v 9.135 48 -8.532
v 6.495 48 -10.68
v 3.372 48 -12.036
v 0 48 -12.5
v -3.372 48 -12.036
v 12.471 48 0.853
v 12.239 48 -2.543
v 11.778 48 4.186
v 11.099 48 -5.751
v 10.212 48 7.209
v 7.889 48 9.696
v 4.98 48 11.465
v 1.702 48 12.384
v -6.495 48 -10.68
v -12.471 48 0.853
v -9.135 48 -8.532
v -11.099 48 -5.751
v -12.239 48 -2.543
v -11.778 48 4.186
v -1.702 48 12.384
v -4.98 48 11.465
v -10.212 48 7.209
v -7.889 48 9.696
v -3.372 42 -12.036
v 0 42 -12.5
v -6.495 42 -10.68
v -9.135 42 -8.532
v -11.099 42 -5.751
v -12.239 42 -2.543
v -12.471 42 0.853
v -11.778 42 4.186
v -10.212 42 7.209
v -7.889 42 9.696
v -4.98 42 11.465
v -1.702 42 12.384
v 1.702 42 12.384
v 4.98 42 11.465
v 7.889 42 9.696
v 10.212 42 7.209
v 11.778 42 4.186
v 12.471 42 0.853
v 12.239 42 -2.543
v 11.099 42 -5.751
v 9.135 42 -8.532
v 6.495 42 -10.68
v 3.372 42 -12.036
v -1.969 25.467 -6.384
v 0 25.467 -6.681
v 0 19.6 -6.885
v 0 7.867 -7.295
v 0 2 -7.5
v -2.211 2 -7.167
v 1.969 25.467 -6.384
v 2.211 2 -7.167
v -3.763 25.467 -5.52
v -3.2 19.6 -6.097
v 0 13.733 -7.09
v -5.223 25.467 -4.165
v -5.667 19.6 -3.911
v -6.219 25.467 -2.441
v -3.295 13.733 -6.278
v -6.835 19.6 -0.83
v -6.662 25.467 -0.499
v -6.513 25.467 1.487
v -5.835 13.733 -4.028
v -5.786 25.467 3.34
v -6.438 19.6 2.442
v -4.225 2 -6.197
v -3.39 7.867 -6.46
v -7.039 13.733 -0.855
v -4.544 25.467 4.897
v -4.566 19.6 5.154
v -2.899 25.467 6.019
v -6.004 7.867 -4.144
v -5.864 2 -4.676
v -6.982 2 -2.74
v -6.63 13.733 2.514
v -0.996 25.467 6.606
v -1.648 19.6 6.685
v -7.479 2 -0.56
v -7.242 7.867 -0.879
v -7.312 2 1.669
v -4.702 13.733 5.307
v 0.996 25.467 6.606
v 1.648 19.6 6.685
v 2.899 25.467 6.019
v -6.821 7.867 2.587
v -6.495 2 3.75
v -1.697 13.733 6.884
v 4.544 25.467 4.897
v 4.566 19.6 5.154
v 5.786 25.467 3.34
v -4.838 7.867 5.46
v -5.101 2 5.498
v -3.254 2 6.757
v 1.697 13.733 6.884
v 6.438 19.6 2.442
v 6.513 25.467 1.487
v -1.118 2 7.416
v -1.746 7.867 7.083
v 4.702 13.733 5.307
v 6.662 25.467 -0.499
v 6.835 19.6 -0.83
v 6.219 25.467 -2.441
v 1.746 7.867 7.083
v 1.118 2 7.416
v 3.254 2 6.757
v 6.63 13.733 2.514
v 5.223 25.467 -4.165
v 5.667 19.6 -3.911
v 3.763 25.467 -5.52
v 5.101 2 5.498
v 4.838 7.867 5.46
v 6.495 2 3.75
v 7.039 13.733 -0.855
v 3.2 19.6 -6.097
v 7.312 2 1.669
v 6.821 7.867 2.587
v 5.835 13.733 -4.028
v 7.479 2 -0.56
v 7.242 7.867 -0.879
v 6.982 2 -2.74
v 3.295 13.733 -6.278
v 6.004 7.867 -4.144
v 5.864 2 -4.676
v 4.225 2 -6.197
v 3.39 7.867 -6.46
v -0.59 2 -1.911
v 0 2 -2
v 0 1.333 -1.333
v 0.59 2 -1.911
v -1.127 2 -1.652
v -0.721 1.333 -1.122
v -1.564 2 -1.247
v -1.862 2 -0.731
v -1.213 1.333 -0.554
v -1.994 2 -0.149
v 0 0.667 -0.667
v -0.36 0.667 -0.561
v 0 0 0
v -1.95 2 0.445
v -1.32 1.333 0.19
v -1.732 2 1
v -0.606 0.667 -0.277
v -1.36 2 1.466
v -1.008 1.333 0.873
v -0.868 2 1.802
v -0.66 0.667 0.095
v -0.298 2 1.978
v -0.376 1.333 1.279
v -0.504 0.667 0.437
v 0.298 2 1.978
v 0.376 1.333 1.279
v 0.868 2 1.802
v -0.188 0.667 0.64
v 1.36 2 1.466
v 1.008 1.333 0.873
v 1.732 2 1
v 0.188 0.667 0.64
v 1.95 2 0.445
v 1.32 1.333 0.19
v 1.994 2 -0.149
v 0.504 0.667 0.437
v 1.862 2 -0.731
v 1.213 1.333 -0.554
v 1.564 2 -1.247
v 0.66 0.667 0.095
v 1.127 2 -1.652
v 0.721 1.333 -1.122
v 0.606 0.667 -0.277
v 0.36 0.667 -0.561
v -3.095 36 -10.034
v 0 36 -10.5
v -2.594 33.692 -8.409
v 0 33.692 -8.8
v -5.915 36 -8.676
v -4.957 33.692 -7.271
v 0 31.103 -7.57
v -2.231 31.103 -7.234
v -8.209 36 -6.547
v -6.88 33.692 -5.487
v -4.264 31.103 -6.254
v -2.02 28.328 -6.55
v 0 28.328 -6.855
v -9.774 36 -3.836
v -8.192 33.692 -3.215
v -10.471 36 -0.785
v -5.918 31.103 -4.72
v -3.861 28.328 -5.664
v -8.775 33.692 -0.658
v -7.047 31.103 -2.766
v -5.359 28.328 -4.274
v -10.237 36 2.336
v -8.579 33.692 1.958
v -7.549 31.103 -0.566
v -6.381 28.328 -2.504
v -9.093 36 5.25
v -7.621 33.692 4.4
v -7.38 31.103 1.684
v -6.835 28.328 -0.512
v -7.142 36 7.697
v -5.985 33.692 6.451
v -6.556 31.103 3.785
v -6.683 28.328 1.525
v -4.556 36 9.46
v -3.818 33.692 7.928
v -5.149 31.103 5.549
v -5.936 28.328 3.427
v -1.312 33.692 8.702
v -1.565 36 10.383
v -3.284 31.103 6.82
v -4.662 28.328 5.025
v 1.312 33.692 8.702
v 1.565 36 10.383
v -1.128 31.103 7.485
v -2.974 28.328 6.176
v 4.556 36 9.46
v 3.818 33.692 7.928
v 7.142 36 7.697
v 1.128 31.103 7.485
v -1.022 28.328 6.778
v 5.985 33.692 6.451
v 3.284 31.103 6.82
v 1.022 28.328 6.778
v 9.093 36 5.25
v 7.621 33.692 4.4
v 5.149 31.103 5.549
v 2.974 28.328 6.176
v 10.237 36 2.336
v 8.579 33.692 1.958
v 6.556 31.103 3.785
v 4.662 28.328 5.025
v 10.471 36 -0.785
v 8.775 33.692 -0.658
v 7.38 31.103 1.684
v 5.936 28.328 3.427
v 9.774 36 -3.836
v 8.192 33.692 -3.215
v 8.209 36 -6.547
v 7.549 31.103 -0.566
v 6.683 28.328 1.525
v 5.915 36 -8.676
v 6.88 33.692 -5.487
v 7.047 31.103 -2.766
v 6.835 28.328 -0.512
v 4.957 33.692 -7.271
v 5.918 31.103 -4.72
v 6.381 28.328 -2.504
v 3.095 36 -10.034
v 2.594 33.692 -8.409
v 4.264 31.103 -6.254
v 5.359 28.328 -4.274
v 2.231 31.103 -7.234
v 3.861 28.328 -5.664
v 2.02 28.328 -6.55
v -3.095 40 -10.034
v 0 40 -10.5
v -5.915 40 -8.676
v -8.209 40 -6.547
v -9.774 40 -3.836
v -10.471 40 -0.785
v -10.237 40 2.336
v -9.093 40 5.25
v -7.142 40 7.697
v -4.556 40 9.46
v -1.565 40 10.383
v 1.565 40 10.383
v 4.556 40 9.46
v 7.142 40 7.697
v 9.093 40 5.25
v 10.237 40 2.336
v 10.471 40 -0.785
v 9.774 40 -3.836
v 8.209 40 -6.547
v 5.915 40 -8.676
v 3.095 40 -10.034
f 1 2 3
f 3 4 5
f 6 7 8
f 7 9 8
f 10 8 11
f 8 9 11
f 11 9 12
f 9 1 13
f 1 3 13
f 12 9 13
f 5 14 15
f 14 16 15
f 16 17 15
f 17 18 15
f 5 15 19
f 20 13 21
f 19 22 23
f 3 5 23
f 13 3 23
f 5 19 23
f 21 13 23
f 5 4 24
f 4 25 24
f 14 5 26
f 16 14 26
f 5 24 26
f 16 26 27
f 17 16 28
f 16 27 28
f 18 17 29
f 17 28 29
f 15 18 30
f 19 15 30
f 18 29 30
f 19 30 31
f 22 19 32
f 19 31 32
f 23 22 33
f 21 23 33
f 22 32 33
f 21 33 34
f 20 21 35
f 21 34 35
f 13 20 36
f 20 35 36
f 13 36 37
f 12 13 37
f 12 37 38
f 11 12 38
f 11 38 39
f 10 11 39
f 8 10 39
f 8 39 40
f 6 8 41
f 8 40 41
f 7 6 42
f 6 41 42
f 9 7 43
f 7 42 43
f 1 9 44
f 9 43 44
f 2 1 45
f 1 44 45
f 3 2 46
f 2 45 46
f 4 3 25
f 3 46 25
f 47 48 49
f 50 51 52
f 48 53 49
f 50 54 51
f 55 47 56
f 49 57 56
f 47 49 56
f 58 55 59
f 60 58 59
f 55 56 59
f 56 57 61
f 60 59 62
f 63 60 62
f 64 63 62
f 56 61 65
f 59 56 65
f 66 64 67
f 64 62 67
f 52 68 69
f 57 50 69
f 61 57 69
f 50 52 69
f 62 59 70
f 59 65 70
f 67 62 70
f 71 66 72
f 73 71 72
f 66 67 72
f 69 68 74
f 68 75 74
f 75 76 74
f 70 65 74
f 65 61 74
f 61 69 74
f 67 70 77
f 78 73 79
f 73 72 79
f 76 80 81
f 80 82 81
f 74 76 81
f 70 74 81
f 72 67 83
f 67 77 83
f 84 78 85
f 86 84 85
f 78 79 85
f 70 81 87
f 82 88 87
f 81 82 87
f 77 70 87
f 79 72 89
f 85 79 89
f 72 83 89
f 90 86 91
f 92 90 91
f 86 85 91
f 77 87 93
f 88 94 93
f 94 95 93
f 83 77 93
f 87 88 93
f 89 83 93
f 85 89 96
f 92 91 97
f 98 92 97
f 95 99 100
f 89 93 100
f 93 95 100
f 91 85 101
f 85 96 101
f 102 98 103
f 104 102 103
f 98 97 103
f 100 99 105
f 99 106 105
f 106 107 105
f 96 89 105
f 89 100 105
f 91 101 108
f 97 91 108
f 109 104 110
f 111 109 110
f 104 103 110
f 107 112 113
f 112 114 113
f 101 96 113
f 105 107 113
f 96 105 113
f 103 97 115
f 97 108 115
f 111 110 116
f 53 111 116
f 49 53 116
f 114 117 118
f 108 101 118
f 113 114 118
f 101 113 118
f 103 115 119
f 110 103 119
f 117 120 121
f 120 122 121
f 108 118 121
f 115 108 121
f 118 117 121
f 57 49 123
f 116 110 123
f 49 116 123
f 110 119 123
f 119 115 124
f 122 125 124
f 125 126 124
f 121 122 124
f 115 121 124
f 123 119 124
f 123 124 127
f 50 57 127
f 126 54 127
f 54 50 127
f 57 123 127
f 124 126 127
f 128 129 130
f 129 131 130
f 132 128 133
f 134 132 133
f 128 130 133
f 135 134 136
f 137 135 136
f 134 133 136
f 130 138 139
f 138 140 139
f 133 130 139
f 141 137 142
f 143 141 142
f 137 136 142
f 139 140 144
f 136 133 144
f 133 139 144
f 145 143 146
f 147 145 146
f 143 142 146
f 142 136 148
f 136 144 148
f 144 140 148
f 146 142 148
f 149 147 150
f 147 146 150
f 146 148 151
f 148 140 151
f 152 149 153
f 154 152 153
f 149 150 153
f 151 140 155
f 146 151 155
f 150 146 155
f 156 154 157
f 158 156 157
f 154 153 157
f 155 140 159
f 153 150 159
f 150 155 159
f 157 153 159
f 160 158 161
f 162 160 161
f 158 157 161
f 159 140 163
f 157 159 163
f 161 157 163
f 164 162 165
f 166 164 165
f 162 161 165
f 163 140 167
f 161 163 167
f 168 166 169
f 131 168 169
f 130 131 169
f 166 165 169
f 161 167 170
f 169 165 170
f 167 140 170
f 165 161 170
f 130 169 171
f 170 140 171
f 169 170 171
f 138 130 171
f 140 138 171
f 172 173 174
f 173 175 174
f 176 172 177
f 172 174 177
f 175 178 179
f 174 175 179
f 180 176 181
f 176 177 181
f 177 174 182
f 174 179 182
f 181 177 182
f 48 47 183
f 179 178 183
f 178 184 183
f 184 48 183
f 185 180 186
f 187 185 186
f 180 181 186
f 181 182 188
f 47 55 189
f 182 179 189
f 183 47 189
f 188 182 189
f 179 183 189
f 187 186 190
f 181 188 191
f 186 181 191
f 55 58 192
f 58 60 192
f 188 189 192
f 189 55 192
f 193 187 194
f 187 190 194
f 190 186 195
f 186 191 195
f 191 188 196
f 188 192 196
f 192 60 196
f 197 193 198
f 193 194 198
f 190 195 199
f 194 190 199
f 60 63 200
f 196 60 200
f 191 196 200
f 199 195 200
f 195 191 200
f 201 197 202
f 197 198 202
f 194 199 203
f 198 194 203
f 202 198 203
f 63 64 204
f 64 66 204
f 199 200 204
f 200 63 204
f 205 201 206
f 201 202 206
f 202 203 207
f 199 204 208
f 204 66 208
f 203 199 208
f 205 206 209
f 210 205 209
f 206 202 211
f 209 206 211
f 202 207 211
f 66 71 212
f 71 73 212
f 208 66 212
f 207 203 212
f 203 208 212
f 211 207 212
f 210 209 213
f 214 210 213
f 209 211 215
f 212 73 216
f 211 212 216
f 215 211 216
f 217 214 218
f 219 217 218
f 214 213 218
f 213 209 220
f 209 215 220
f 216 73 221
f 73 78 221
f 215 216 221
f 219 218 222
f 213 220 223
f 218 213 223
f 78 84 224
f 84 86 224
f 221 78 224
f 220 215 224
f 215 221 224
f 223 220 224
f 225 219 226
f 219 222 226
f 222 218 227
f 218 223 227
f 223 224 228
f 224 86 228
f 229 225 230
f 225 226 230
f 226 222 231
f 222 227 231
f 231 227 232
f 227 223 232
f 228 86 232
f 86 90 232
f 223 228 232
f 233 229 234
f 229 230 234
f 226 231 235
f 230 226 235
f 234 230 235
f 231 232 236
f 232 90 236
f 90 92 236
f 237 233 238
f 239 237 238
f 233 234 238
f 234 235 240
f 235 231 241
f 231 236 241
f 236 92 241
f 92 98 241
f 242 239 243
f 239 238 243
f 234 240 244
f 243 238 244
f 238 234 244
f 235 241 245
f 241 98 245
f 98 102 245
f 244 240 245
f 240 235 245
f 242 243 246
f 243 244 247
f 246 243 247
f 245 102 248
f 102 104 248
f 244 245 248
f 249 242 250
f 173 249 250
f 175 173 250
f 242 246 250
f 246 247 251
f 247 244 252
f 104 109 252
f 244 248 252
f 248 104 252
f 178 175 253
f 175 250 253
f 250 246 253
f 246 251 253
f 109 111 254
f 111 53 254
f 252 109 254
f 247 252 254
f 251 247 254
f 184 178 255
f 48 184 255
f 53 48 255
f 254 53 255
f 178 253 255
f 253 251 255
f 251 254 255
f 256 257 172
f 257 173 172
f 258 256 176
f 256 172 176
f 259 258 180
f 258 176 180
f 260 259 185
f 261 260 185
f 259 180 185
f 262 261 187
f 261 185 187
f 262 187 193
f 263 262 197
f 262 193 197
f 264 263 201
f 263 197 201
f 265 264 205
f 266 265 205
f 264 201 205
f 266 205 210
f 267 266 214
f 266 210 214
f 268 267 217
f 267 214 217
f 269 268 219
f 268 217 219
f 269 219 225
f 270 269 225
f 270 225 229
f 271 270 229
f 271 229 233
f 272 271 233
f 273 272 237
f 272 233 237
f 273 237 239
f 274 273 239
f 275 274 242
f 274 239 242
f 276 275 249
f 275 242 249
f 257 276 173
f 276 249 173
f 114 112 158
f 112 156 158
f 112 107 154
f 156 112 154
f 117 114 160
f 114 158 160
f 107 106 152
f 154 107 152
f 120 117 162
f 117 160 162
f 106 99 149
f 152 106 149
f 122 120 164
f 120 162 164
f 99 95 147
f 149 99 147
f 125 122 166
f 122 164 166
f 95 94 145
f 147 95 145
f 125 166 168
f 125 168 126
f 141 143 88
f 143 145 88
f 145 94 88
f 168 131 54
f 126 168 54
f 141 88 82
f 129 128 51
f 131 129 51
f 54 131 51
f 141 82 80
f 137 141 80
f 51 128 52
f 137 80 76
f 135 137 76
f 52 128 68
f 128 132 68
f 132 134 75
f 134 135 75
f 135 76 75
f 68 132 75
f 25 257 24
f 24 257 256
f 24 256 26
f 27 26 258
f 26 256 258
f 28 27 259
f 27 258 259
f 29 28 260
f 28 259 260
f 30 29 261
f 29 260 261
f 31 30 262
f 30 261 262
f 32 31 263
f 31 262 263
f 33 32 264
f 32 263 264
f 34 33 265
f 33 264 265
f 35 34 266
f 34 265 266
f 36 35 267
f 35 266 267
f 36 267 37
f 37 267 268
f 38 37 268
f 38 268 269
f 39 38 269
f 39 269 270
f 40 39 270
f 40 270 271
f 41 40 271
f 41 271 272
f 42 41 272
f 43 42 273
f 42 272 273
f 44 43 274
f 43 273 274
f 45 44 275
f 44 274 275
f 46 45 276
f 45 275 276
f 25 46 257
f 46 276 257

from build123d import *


with BuildPart() as part:
    # Sketch1 → Revolve1 (revolve)
    with BuildSketch(Plane.XY, mode=Mode.PRIVATE) as revolve1_sk:
        with BuildLine():
            Line((0, 48), (12.5, 48))
            Line((12.5, 48), (12.5, 42))
            Line((12.5, 42), (10.5, 40))
            Line((10.5, 40), (10.5, 36))
            ThreePointArc((10.5, 36), (7.569816074, 31.103274793), (6.680531261, 25.466514365))
            Line((6.680531261, 25.466514365), (7.5, 2))
            Line((7.5, 2), (2, 2))
            Line((2, 2), (0, 0))
            Line((0, 0), (0, 48))
        make_face()
    revolve(revolve1_sk.sketch.rotate(Axis((0, 0, 0), (0, 1, 0)), 90), axis=Axis((0, 0, 0), (0, 1, 0)))  # turned: the seam where the file's is


solid = part.part
